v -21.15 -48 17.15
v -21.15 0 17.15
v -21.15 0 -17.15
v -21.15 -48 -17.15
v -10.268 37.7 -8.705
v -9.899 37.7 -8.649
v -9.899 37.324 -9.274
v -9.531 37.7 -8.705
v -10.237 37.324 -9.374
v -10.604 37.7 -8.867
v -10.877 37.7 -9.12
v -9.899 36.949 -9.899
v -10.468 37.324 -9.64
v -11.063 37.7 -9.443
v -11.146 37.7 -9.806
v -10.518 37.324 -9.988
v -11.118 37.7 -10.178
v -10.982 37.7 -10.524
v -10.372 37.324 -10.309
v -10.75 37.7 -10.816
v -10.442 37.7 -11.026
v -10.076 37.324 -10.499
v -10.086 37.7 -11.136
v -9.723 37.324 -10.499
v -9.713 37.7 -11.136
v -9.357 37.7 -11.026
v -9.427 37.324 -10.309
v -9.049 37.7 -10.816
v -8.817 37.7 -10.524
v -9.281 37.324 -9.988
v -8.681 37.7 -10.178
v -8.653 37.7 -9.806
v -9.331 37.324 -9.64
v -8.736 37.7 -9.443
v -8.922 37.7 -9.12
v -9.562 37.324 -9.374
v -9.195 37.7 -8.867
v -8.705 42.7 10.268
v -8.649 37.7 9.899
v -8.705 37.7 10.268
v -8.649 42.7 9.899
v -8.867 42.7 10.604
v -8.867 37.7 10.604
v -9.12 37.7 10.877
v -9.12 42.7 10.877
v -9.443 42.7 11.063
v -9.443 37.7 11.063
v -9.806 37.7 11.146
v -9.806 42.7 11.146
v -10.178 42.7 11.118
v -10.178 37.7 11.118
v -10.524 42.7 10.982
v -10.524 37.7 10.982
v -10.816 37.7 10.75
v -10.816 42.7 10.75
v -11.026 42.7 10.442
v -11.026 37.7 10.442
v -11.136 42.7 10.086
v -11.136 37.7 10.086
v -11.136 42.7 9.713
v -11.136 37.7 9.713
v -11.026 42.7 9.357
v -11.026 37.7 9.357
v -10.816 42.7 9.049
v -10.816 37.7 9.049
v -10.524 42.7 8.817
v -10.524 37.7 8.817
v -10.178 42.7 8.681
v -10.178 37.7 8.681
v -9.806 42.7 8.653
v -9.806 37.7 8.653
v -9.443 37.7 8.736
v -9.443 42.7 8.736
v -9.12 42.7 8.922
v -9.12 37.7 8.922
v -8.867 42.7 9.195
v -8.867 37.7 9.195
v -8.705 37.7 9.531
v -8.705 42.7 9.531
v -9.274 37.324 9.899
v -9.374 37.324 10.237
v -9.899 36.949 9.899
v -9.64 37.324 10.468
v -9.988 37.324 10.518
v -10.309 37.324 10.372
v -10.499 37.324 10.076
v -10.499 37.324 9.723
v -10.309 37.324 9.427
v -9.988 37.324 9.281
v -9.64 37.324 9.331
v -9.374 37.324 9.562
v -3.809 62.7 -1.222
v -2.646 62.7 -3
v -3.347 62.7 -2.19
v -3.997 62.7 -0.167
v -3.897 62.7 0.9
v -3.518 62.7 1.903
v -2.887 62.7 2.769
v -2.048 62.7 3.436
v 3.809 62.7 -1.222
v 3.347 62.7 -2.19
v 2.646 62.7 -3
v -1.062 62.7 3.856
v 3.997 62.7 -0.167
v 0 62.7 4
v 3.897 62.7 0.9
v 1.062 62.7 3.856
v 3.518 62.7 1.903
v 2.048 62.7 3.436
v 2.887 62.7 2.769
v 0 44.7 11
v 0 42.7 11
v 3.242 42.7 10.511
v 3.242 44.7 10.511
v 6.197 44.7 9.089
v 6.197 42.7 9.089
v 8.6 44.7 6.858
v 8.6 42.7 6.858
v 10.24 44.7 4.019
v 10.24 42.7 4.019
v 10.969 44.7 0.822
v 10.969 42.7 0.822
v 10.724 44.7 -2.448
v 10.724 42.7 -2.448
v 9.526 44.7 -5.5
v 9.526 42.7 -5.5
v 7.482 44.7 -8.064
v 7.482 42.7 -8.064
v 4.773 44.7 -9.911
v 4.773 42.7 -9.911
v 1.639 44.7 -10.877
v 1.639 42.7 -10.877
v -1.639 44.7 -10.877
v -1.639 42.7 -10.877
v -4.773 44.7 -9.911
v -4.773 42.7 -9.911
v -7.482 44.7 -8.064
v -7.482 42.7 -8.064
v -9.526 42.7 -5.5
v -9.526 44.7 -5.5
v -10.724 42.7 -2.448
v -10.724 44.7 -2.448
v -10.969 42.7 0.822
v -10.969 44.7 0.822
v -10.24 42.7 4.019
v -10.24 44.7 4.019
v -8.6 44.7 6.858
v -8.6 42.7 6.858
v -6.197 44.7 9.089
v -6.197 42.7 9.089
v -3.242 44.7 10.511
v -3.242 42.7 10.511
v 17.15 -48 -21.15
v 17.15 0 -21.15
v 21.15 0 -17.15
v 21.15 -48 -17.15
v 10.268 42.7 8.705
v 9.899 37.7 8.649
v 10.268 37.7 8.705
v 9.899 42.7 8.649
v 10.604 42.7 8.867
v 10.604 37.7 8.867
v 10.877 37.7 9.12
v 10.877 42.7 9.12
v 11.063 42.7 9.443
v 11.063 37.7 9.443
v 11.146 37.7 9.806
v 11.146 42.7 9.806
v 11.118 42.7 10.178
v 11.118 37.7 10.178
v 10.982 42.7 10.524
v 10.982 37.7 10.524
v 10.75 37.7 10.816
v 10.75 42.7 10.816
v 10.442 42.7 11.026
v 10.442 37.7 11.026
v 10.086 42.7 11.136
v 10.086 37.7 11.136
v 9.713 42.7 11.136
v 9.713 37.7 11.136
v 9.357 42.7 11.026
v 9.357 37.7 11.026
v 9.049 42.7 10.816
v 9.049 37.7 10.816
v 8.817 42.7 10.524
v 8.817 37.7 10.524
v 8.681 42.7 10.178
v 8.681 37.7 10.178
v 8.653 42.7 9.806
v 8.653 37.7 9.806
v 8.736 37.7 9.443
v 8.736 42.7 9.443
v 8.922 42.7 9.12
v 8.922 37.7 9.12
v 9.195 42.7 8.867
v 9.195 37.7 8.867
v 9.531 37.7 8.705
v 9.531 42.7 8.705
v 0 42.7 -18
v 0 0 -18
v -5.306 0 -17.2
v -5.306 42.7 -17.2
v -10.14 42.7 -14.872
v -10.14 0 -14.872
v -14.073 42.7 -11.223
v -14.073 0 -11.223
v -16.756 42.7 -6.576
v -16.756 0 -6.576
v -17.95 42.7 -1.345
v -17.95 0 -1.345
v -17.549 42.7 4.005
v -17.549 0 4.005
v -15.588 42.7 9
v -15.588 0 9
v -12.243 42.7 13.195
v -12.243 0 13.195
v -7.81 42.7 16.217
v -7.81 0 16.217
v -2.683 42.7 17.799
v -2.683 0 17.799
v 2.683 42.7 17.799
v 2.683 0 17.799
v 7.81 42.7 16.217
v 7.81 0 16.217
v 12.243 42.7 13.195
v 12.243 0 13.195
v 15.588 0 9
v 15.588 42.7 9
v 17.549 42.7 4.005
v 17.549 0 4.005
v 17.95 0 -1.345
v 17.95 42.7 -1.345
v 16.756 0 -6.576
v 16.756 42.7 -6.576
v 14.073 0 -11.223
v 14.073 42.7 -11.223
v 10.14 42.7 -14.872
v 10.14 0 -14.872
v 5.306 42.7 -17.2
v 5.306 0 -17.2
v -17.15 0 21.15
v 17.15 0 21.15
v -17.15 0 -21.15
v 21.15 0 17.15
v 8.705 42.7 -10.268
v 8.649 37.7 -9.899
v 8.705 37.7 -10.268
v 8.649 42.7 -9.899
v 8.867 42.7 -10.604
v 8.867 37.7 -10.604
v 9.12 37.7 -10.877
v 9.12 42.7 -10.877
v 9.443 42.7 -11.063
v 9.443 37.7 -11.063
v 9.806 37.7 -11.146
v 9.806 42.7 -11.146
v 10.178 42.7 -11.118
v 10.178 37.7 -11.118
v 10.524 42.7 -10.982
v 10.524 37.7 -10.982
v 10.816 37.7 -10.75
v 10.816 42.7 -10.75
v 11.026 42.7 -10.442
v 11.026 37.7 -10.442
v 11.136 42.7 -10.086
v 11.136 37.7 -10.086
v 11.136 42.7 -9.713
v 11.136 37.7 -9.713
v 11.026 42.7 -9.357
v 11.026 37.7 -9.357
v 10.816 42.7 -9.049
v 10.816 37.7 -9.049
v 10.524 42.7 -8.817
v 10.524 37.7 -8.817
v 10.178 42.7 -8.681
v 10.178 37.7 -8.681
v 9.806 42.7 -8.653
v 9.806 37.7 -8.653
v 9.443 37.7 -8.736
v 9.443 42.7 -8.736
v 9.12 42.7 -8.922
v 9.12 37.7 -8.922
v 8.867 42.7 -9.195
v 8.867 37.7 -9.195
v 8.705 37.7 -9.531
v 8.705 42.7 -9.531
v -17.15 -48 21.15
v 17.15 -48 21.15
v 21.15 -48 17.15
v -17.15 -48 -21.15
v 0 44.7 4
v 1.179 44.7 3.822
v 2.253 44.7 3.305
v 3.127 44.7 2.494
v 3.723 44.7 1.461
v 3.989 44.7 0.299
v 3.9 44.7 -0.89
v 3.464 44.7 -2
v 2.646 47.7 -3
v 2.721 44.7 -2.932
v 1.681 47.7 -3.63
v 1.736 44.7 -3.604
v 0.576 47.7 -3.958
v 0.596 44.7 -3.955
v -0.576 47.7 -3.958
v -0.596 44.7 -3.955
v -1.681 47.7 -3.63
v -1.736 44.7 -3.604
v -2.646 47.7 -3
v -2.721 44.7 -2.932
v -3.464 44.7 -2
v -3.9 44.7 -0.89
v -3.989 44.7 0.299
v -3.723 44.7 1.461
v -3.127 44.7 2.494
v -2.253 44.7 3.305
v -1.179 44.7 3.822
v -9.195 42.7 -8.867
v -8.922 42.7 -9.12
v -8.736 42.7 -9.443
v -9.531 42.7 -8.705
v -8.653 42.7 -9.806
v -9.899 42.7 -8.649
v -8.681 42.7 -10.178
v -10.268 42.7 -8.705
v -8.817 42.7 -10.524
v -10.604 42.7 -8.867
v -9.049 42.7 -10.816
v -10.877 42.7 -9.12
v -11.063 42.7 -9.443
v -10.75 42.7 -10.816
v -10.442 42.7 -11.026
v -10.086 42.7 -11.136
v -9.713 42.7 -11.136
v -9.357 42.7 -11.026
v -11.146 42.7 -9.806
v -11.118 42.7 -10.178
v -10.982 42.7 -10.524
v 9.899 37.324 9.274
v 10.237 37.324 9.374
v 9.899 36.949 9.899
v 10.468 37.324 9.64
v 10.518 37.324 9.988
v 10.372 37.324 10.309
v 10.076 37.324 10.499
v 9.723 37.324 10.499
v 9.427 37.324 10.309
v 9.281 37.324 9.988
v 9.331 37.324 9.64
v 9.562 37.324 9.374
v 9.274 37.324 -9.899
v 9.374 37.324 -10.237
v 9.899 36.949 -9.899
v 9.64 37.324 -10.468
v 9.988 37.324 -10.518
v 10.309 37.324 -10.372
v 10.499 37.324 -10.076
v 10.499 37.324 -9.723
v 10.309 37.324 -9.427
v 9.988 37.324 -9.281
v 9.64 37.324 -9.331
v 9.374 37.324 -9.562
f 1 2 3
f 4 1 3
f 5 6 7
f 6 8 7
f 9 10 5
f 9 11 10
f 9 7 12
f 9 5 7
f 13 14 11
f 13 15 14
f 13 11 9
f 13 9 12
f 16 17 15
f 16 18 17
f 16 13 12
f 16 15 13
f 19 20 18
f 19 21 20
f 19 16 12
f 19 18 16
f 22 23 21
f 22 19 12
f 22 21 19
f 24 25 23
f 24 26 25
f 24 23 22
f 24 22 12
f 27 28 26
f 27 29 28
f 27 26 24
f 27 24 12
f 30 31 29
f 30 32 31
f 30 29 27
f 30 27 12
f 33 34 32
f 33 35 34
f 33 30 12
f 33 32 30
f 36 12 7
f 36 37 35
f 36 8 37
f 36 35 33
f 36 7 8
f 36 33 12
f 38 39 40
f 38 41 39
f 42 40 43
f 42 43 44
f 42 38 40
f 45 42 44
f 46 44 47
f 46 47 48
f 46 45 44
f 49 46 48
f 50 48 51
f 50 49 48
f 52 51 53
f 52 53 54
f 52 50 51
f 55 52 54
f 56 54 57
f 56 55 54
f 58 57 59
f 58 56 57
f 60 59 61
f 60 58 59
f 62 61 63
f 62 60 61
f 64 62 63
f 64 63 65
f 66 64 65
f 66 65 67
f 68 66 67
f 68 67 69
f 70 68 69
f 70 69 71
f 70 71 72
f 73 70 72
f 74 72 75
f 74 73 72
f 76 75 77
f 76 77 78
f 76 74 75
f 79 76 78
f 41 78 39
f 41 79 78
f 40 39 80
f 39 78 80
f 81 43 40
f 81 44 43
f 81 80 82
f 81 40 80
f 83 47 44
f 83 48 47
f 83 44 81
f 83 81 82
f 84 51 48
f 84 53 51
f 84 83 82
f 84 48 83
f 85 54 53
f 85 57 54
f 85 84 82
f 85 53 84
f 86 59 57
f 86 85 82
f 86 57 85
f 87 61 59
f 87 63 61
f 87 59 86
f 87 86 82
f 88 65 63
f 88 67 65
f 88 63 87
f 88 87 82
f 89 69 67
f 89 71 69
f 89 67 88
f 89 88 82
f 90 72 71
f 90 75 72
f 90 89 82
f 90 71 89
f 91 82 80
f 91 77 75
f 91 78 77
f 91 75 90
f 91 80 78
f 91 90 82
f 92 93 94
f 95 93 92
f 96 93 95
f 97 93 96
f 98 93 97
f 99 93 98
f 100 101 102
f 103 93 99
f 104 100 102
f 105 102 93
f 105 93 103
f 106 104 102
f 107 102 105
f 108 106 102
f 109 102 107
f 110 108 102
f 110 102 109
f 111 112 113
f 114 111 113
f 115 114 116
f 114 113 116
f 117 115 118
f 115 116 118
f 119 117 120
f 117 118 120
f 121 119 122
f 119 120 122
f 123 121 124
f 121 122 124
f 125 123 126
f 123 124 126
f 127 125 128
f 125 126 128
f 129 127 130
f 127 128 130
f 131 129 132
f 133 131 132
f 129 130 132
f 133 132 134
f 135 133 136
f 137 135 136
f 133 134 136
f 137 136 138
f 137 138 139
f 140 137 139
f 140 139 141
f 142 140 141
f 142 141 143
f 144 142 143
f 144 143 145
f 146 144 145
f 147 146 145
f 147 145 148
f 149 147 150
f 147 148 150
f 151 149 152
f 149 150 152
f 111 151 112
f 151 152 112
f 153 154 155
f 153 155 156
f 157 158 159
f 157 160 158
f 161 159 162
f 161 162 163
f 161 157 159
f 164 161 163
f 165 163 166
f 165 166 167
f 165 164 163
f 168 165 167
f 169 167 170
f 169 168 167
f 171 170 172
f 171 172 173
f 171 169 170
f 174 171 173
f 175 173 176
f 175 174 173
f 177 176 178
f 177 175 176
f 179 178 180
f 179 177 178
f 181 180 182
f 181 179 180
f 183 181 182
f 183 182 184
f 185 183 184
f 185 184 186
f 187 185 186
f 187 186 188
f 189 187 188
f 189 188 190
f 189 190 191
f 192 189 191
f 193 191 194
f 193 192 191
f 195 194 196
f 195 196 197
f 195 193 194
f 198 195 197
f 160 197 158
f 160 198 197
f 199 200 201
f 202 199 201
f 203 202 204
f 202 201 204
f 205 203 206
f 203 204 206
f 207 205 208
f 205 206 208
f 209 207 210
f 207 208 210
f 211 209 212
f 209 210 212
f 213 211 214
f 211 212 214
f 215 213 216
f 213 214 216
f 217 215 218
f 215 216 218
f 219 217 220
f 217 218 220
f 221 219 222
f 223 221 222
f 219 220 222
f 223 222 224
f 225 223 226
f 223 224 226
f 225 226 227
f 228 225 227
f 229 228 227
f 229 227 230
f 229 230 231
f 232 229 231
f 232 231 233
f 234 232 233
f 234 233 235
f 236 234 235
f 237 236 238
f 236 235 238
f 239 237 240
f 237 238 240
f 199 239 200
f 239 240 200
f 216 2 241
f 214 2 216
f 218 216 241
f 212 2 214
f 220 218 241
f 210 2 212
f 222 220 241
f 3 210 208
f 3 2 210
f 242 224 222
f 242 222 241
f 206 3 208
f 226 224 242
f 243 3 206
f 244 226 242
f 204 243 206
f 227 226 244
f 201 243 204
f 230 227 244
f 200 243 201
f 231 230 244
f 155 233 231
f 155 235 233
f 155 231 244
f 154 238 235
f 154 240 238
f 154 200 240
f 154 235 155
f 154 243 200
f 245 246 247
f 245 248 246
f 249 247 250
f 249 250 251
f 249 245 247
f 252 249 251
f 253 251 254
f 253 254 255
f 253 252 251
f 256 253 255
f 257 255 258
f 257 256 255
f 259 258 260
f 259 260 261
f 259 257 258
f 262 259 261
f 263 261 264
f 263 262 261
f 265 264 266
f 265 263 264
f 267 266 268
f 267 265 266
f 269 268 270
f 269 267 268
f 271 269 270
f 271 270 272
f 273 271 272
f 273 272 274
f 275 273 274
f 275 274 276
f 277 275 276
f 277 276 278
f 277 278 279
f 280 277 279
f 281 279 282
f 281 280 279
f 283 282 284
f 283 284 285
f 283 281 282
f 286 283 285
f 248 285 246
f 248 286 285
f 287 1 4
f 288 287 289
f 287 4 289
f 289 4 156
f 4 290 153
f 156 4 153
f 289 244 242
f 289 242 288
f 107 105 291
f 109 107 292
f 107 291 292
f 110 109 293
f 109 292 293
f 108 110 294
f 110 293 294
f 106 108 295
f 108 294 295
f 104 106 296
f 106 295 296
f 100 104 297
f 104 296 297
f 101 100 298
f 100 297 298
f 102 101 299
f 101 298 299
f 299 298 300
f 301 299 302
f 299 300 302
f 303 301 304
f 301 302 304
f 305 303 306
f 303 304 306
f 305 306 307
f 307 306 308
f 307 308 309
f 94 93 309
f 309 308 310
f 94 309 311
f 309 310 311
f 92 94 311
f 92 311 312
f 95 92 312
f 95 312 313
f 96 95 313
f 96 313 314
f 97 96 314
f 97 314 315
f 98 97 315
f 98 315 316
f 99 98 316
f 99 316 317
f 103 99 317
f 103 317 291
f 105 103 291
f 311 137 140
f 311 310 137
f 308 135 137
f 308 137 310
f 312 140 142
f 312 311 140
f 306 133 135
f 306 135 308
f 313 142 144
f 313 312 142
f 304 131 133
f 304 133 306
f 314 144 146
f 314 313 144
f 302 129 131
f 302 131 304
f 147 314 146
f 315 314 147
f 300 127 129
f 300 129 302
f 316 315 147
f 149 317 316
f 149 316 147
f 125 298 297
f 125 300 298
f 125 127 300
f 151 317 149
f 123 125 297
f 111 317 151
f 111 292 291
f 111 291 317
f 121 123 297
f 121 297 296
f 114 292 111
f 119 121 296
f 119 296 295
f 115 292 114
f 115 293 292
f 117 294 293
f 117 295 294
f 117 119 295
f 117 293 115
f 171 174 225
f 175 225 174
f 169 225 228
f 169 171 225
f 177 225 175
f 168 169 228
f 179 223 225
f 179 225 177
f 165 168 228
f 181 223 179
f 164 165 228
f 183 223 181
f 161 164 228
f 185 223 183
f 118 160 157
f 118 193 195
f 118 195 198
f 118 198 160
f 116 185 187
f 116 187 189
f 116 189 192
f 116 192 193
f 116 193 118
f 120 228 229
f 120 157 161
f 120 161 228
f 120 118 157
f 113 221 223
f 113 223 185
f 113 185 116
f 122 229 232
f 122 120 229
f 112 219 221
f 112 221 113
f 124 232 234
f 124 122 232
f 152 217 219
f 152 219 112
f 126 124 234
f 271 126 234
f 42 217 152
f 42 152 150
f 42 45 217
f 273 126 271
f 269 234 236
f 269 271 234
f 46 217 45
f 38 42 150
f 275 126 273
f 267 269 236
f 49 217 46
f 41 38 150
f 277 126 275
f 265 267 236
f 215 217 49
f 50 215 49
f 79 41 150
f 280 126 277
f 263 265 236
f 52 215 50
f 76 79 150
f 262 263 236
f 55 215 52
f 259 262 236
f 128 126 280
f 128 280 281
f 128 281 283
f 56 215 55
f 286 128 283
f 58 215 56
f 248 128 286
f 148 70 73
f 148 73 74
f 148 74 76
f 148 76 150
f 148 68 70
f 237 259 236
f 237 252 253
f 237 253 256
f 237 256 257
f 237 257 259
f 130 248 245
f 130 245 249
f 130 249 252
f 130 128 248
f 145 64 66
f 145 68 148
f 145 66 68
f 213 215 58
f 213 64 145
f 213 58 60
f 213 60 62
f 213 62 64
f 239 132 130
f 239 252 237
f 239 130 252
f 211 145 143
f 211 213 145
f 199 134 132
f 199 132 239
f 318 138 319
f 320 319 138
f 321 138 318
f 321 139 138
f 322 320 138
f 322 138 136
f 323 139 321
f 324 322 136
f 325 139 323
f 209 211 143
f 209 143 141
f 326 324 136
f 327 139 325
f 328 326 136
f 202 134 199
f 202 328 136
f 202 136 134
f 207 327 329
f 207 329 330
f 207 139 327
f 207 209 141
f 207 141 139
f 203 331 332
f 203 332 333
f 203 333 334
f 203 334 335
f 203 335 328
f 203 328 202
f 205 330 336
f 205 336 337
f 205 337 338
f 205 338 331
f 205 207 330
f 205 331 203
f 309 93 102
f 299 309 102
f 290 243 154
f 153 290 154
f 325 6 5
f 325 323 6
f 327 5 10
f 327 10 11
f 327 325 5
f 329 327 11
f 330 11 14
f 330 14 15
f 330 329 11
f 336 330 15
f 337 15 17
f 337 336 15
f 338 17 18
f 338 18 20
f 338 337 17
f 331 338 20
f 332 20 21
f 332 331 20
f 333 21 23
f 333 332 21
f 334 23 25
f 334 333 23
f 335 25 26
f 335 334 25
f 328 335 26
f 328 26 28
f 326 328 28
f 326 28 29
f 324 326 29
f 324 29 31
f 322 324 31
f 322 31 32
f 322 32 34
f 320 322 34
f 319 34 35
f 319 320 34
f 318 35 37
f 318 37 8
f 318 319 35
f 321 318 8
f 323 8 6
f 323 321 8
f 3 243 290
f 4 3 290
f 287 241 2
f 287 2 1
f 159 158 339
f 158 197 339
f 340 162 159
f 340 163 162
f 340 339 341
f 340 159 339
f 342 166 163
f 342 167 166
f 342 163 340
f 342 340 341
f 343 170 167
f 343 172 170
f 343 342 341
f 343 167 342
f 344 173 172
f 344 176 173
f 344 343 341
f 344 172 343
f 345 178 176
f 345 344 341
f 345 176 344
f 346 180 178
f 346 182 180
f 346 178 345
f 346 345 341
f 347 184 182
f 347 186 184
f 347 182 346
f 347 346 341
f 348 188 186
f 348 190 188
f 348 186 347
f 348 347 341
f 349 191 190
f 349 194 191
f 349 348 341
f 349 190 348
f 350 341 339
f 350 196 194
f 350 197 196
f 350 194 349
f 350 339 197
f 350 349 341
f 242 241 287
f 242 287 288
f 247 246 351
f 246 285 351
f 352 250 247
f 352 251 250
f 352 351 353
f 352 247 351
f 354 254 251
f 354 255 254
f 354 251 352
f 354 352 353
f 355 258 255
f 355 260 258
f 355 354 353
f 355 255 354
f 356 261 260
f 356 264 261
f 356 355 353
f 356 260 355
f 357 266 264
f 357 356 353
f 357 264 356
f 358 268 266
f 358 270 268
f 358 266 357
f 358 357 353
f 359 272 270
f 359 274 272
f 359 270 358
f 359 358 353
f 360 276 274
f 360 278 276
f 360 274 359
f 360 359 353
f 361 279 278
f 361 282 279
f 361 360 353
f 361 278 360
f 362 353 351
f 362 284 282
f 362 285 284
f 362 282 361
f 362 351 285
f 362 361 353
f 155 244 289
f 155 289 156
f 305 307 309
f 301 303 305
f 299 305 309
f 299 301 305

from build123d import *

# Parameters (mm, degrees)
ESQUISSE1_W                  = 42.3
ESQUISSE1_H                  = 42.3
MOTEUR_DEPTH                 = 48
CHANFREIN1_SIZE              = 4
ESQUISSE2_R                  = 18
BOSS_EXTRU_2_DEPTH           = 42.7
ESQUISSE3_R                  = 11
BOSS_EXTRU_3_DEPTH           = 2
ESQUISSE4_R                  = 4
BOSS_EXTRU_4_DEPTH           = 18
ESQUISSE5_W                  = 5.291502622
ESQUISSE5_H                  = 1
ENL_V_MAT_EXTRU_1_DEPTH      = 15
R_P_TITION_CIRCULAIRE1_COUNT = 4


with BuildPart() as part:
    # Esquisse1 → Moteur (new body)
    with BuildSketch(Plane(origin=(0, 0, 0), x_dir=(1, 0, 0), z_dir=(0, 1, 0))):
        Rectangle(ESQUISSE1_W, ESQUISSE1_H)
    extrude(amount=-MOTEUR_DEPTH)

    # Chanfrein1
    chanfrein1_edges = [part.edges().sort_by_distance(p)[0] for p in [
        (21.15, -24, -21.15),
        (-21.15, -24, -21.15),
        (-21.15, -24, 21.15),
        (21.15, -24, 21.15),
    ]]
    chamfer(chanfrein1_edges, length=CHANFREIN1_SIZE)

    # Esquisse2 → Boss.-Extru.2 (add)
    with BuildSketch(Plane(origin=(0, 0, 0), x_dir=(1, 0, 0), z_dir=(0, 1, 0))):
        Circle(ESQUISSE2_R)
    extrude(amount=BOSS_EXTRU_2_DEPTH)

    # Esquisse3 → Boss.-Extru.3 (add)
    with BuildSketch(Plane(origin=(0, 42.7, 0), x_dir=(1, 0, 0), z_dir=(0, 1, 0))):
        Circle(ESQUISSE3_R)
    extrude(amount=BOSS_EXTRU_3_DEPTH)

    # Esquisse4 → Boss.-Extru.4 (add)
    with BuildSketch(Plane(origin=(0, 44.7, 0), x_dir=(1, 0, 0), z_dir=(0, 1, 0))):
        Circle(ESQUISSE4_R)
    extrude(amount=BOSS_EXTRU_4_DEPTH)

    # Esquisse5 → Enlèv. mat.-Extru.1 (cut)
    with BuildSketch(Plane(origin=(0, 62.7, 0), x_dir=(1, 0, 0), z_dir=(0, 1, 0))):
        with Locations((0, 3.5)):
            Rectangle(ESQUISSE5_W, ESQUISSE5_H)
    extrude(amount=-ENL_V_MAT_EXTRU_1_DEPTH, mode=Mode.SUBTRACT)

    # Esquisse7 → Trou pour taraudage pour trou taraudé M3x0.51 (revolve, cut)
    with BuildSketch(Plane(origin=(-9.899494937, 42.7, -9.899494937), x_dir=(0, 0, 1), z_dir=(1, 0, 0))):
        Polygon((0, 0), (0, 5.751075774), (1.25, 5), (1.25, 0), align=None)
    trou_pour_taraudage_pour_trou_taraud_m3 = revolve(axis=Axis((-9.899494937, 49.05, -9.899494937), (0, -1, 0)), mode=Mode.SUBTRACT)

    # Répétition circulaire1: Trou pour taraudage pour trou taraudé M3x0.51 ×4 about axis
    r_p_tition_circulaire1_axis = Axis((0, 69.927993494, 0), (0, -1, 0))
    for i in range(1, R_P_TITION_CIRCULAIRE1_COUNT):
        add(trou_pour_taraudage_pour_trou_taraud_m3.rotate(r_p_tition_circulaire1_axis, i * 360 / R_P_TITION_CIRCULAIRE1_COUNT), mode=Mode.SUBTRACT)


solid = part.part
